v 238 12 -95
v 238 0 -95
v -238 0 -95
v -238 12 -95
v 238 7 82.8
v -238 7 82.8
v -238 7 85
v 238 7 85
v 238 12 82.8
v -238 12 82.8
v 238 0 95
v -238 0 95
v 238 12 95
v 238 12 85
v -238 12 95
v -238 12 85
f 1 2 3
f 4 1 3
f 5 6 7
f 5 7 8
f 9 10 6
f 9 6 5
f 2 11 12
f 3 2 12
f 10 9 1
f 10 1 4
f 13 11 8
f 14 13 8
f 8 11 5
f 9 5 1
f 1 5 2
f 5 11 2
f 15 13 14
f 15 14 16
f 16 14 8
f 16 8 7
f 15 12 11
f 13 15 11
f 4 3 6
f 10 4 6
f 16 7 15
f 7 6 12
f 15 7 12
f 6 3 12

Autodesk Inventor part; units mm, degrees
ref_plane "YZ Plane" through (0, 0, 0) normal (1, 0, 0) x (0, 1, 0)
ref_plane "XZ Plane" through (0, 0, 0) normal (0, 1, 0) x (-1, 0, 0)
ref_plane "XY Plane" through (0, 0, 0) normal (0, 0, 1) x (1, 0, 0)
sketch "Skizze1" plane through (0, 0, 0) normal (0, 1, 0) x (-1, 0, 0)
  line L0 (238, 95) -> (-238, 95)
  line L1 (-238, 95) -> (-238, -95)
  line L2 (-238, -95) -> (238, -95)
  line L3 (238, -95) -> (238, 95)
  point P0 (0, 0)
  point P1 (0, 95)
  point P2 (-238, 0)
  dimension "d0" = 476
  dimension "d1" = 190
extrude "Extrusion1" add sketch "Skizze1" along normal blind 12
sketch "Skizze2" plane through (0, 12, 0) normal (0, 1, 0) x (1, 0, 0)
  line L0 (238, -95) -> (238, 95) projected
  line L1 (238, 95) -> (-238, 95) projected
  line L2 (-238, 95) -> (-238, -95) projected
  line L3 (-238, -95) -> (238, -95) projected
  line L4 (238, -95) -> (238, 95) projected
  line L5 (238, -85) -> (-238, -85)
  line L6 (-238, -85) -> (-238, -82.8)
  line L7 (-238, -82.8) -> (238, -82.8)
  line L8 (238, -82.8) -> (238, -85)
  point P0 (0, 0)
  dimension "d4" = 10
  dimension "d5" = 2.2
extrude "Extrusion2" cut sketch "Skizze2" against normal blind 5 contours L5 L2 L7 L0
properties part number "Oberseite_Shotclock" material "Holz (Kirsche)"
